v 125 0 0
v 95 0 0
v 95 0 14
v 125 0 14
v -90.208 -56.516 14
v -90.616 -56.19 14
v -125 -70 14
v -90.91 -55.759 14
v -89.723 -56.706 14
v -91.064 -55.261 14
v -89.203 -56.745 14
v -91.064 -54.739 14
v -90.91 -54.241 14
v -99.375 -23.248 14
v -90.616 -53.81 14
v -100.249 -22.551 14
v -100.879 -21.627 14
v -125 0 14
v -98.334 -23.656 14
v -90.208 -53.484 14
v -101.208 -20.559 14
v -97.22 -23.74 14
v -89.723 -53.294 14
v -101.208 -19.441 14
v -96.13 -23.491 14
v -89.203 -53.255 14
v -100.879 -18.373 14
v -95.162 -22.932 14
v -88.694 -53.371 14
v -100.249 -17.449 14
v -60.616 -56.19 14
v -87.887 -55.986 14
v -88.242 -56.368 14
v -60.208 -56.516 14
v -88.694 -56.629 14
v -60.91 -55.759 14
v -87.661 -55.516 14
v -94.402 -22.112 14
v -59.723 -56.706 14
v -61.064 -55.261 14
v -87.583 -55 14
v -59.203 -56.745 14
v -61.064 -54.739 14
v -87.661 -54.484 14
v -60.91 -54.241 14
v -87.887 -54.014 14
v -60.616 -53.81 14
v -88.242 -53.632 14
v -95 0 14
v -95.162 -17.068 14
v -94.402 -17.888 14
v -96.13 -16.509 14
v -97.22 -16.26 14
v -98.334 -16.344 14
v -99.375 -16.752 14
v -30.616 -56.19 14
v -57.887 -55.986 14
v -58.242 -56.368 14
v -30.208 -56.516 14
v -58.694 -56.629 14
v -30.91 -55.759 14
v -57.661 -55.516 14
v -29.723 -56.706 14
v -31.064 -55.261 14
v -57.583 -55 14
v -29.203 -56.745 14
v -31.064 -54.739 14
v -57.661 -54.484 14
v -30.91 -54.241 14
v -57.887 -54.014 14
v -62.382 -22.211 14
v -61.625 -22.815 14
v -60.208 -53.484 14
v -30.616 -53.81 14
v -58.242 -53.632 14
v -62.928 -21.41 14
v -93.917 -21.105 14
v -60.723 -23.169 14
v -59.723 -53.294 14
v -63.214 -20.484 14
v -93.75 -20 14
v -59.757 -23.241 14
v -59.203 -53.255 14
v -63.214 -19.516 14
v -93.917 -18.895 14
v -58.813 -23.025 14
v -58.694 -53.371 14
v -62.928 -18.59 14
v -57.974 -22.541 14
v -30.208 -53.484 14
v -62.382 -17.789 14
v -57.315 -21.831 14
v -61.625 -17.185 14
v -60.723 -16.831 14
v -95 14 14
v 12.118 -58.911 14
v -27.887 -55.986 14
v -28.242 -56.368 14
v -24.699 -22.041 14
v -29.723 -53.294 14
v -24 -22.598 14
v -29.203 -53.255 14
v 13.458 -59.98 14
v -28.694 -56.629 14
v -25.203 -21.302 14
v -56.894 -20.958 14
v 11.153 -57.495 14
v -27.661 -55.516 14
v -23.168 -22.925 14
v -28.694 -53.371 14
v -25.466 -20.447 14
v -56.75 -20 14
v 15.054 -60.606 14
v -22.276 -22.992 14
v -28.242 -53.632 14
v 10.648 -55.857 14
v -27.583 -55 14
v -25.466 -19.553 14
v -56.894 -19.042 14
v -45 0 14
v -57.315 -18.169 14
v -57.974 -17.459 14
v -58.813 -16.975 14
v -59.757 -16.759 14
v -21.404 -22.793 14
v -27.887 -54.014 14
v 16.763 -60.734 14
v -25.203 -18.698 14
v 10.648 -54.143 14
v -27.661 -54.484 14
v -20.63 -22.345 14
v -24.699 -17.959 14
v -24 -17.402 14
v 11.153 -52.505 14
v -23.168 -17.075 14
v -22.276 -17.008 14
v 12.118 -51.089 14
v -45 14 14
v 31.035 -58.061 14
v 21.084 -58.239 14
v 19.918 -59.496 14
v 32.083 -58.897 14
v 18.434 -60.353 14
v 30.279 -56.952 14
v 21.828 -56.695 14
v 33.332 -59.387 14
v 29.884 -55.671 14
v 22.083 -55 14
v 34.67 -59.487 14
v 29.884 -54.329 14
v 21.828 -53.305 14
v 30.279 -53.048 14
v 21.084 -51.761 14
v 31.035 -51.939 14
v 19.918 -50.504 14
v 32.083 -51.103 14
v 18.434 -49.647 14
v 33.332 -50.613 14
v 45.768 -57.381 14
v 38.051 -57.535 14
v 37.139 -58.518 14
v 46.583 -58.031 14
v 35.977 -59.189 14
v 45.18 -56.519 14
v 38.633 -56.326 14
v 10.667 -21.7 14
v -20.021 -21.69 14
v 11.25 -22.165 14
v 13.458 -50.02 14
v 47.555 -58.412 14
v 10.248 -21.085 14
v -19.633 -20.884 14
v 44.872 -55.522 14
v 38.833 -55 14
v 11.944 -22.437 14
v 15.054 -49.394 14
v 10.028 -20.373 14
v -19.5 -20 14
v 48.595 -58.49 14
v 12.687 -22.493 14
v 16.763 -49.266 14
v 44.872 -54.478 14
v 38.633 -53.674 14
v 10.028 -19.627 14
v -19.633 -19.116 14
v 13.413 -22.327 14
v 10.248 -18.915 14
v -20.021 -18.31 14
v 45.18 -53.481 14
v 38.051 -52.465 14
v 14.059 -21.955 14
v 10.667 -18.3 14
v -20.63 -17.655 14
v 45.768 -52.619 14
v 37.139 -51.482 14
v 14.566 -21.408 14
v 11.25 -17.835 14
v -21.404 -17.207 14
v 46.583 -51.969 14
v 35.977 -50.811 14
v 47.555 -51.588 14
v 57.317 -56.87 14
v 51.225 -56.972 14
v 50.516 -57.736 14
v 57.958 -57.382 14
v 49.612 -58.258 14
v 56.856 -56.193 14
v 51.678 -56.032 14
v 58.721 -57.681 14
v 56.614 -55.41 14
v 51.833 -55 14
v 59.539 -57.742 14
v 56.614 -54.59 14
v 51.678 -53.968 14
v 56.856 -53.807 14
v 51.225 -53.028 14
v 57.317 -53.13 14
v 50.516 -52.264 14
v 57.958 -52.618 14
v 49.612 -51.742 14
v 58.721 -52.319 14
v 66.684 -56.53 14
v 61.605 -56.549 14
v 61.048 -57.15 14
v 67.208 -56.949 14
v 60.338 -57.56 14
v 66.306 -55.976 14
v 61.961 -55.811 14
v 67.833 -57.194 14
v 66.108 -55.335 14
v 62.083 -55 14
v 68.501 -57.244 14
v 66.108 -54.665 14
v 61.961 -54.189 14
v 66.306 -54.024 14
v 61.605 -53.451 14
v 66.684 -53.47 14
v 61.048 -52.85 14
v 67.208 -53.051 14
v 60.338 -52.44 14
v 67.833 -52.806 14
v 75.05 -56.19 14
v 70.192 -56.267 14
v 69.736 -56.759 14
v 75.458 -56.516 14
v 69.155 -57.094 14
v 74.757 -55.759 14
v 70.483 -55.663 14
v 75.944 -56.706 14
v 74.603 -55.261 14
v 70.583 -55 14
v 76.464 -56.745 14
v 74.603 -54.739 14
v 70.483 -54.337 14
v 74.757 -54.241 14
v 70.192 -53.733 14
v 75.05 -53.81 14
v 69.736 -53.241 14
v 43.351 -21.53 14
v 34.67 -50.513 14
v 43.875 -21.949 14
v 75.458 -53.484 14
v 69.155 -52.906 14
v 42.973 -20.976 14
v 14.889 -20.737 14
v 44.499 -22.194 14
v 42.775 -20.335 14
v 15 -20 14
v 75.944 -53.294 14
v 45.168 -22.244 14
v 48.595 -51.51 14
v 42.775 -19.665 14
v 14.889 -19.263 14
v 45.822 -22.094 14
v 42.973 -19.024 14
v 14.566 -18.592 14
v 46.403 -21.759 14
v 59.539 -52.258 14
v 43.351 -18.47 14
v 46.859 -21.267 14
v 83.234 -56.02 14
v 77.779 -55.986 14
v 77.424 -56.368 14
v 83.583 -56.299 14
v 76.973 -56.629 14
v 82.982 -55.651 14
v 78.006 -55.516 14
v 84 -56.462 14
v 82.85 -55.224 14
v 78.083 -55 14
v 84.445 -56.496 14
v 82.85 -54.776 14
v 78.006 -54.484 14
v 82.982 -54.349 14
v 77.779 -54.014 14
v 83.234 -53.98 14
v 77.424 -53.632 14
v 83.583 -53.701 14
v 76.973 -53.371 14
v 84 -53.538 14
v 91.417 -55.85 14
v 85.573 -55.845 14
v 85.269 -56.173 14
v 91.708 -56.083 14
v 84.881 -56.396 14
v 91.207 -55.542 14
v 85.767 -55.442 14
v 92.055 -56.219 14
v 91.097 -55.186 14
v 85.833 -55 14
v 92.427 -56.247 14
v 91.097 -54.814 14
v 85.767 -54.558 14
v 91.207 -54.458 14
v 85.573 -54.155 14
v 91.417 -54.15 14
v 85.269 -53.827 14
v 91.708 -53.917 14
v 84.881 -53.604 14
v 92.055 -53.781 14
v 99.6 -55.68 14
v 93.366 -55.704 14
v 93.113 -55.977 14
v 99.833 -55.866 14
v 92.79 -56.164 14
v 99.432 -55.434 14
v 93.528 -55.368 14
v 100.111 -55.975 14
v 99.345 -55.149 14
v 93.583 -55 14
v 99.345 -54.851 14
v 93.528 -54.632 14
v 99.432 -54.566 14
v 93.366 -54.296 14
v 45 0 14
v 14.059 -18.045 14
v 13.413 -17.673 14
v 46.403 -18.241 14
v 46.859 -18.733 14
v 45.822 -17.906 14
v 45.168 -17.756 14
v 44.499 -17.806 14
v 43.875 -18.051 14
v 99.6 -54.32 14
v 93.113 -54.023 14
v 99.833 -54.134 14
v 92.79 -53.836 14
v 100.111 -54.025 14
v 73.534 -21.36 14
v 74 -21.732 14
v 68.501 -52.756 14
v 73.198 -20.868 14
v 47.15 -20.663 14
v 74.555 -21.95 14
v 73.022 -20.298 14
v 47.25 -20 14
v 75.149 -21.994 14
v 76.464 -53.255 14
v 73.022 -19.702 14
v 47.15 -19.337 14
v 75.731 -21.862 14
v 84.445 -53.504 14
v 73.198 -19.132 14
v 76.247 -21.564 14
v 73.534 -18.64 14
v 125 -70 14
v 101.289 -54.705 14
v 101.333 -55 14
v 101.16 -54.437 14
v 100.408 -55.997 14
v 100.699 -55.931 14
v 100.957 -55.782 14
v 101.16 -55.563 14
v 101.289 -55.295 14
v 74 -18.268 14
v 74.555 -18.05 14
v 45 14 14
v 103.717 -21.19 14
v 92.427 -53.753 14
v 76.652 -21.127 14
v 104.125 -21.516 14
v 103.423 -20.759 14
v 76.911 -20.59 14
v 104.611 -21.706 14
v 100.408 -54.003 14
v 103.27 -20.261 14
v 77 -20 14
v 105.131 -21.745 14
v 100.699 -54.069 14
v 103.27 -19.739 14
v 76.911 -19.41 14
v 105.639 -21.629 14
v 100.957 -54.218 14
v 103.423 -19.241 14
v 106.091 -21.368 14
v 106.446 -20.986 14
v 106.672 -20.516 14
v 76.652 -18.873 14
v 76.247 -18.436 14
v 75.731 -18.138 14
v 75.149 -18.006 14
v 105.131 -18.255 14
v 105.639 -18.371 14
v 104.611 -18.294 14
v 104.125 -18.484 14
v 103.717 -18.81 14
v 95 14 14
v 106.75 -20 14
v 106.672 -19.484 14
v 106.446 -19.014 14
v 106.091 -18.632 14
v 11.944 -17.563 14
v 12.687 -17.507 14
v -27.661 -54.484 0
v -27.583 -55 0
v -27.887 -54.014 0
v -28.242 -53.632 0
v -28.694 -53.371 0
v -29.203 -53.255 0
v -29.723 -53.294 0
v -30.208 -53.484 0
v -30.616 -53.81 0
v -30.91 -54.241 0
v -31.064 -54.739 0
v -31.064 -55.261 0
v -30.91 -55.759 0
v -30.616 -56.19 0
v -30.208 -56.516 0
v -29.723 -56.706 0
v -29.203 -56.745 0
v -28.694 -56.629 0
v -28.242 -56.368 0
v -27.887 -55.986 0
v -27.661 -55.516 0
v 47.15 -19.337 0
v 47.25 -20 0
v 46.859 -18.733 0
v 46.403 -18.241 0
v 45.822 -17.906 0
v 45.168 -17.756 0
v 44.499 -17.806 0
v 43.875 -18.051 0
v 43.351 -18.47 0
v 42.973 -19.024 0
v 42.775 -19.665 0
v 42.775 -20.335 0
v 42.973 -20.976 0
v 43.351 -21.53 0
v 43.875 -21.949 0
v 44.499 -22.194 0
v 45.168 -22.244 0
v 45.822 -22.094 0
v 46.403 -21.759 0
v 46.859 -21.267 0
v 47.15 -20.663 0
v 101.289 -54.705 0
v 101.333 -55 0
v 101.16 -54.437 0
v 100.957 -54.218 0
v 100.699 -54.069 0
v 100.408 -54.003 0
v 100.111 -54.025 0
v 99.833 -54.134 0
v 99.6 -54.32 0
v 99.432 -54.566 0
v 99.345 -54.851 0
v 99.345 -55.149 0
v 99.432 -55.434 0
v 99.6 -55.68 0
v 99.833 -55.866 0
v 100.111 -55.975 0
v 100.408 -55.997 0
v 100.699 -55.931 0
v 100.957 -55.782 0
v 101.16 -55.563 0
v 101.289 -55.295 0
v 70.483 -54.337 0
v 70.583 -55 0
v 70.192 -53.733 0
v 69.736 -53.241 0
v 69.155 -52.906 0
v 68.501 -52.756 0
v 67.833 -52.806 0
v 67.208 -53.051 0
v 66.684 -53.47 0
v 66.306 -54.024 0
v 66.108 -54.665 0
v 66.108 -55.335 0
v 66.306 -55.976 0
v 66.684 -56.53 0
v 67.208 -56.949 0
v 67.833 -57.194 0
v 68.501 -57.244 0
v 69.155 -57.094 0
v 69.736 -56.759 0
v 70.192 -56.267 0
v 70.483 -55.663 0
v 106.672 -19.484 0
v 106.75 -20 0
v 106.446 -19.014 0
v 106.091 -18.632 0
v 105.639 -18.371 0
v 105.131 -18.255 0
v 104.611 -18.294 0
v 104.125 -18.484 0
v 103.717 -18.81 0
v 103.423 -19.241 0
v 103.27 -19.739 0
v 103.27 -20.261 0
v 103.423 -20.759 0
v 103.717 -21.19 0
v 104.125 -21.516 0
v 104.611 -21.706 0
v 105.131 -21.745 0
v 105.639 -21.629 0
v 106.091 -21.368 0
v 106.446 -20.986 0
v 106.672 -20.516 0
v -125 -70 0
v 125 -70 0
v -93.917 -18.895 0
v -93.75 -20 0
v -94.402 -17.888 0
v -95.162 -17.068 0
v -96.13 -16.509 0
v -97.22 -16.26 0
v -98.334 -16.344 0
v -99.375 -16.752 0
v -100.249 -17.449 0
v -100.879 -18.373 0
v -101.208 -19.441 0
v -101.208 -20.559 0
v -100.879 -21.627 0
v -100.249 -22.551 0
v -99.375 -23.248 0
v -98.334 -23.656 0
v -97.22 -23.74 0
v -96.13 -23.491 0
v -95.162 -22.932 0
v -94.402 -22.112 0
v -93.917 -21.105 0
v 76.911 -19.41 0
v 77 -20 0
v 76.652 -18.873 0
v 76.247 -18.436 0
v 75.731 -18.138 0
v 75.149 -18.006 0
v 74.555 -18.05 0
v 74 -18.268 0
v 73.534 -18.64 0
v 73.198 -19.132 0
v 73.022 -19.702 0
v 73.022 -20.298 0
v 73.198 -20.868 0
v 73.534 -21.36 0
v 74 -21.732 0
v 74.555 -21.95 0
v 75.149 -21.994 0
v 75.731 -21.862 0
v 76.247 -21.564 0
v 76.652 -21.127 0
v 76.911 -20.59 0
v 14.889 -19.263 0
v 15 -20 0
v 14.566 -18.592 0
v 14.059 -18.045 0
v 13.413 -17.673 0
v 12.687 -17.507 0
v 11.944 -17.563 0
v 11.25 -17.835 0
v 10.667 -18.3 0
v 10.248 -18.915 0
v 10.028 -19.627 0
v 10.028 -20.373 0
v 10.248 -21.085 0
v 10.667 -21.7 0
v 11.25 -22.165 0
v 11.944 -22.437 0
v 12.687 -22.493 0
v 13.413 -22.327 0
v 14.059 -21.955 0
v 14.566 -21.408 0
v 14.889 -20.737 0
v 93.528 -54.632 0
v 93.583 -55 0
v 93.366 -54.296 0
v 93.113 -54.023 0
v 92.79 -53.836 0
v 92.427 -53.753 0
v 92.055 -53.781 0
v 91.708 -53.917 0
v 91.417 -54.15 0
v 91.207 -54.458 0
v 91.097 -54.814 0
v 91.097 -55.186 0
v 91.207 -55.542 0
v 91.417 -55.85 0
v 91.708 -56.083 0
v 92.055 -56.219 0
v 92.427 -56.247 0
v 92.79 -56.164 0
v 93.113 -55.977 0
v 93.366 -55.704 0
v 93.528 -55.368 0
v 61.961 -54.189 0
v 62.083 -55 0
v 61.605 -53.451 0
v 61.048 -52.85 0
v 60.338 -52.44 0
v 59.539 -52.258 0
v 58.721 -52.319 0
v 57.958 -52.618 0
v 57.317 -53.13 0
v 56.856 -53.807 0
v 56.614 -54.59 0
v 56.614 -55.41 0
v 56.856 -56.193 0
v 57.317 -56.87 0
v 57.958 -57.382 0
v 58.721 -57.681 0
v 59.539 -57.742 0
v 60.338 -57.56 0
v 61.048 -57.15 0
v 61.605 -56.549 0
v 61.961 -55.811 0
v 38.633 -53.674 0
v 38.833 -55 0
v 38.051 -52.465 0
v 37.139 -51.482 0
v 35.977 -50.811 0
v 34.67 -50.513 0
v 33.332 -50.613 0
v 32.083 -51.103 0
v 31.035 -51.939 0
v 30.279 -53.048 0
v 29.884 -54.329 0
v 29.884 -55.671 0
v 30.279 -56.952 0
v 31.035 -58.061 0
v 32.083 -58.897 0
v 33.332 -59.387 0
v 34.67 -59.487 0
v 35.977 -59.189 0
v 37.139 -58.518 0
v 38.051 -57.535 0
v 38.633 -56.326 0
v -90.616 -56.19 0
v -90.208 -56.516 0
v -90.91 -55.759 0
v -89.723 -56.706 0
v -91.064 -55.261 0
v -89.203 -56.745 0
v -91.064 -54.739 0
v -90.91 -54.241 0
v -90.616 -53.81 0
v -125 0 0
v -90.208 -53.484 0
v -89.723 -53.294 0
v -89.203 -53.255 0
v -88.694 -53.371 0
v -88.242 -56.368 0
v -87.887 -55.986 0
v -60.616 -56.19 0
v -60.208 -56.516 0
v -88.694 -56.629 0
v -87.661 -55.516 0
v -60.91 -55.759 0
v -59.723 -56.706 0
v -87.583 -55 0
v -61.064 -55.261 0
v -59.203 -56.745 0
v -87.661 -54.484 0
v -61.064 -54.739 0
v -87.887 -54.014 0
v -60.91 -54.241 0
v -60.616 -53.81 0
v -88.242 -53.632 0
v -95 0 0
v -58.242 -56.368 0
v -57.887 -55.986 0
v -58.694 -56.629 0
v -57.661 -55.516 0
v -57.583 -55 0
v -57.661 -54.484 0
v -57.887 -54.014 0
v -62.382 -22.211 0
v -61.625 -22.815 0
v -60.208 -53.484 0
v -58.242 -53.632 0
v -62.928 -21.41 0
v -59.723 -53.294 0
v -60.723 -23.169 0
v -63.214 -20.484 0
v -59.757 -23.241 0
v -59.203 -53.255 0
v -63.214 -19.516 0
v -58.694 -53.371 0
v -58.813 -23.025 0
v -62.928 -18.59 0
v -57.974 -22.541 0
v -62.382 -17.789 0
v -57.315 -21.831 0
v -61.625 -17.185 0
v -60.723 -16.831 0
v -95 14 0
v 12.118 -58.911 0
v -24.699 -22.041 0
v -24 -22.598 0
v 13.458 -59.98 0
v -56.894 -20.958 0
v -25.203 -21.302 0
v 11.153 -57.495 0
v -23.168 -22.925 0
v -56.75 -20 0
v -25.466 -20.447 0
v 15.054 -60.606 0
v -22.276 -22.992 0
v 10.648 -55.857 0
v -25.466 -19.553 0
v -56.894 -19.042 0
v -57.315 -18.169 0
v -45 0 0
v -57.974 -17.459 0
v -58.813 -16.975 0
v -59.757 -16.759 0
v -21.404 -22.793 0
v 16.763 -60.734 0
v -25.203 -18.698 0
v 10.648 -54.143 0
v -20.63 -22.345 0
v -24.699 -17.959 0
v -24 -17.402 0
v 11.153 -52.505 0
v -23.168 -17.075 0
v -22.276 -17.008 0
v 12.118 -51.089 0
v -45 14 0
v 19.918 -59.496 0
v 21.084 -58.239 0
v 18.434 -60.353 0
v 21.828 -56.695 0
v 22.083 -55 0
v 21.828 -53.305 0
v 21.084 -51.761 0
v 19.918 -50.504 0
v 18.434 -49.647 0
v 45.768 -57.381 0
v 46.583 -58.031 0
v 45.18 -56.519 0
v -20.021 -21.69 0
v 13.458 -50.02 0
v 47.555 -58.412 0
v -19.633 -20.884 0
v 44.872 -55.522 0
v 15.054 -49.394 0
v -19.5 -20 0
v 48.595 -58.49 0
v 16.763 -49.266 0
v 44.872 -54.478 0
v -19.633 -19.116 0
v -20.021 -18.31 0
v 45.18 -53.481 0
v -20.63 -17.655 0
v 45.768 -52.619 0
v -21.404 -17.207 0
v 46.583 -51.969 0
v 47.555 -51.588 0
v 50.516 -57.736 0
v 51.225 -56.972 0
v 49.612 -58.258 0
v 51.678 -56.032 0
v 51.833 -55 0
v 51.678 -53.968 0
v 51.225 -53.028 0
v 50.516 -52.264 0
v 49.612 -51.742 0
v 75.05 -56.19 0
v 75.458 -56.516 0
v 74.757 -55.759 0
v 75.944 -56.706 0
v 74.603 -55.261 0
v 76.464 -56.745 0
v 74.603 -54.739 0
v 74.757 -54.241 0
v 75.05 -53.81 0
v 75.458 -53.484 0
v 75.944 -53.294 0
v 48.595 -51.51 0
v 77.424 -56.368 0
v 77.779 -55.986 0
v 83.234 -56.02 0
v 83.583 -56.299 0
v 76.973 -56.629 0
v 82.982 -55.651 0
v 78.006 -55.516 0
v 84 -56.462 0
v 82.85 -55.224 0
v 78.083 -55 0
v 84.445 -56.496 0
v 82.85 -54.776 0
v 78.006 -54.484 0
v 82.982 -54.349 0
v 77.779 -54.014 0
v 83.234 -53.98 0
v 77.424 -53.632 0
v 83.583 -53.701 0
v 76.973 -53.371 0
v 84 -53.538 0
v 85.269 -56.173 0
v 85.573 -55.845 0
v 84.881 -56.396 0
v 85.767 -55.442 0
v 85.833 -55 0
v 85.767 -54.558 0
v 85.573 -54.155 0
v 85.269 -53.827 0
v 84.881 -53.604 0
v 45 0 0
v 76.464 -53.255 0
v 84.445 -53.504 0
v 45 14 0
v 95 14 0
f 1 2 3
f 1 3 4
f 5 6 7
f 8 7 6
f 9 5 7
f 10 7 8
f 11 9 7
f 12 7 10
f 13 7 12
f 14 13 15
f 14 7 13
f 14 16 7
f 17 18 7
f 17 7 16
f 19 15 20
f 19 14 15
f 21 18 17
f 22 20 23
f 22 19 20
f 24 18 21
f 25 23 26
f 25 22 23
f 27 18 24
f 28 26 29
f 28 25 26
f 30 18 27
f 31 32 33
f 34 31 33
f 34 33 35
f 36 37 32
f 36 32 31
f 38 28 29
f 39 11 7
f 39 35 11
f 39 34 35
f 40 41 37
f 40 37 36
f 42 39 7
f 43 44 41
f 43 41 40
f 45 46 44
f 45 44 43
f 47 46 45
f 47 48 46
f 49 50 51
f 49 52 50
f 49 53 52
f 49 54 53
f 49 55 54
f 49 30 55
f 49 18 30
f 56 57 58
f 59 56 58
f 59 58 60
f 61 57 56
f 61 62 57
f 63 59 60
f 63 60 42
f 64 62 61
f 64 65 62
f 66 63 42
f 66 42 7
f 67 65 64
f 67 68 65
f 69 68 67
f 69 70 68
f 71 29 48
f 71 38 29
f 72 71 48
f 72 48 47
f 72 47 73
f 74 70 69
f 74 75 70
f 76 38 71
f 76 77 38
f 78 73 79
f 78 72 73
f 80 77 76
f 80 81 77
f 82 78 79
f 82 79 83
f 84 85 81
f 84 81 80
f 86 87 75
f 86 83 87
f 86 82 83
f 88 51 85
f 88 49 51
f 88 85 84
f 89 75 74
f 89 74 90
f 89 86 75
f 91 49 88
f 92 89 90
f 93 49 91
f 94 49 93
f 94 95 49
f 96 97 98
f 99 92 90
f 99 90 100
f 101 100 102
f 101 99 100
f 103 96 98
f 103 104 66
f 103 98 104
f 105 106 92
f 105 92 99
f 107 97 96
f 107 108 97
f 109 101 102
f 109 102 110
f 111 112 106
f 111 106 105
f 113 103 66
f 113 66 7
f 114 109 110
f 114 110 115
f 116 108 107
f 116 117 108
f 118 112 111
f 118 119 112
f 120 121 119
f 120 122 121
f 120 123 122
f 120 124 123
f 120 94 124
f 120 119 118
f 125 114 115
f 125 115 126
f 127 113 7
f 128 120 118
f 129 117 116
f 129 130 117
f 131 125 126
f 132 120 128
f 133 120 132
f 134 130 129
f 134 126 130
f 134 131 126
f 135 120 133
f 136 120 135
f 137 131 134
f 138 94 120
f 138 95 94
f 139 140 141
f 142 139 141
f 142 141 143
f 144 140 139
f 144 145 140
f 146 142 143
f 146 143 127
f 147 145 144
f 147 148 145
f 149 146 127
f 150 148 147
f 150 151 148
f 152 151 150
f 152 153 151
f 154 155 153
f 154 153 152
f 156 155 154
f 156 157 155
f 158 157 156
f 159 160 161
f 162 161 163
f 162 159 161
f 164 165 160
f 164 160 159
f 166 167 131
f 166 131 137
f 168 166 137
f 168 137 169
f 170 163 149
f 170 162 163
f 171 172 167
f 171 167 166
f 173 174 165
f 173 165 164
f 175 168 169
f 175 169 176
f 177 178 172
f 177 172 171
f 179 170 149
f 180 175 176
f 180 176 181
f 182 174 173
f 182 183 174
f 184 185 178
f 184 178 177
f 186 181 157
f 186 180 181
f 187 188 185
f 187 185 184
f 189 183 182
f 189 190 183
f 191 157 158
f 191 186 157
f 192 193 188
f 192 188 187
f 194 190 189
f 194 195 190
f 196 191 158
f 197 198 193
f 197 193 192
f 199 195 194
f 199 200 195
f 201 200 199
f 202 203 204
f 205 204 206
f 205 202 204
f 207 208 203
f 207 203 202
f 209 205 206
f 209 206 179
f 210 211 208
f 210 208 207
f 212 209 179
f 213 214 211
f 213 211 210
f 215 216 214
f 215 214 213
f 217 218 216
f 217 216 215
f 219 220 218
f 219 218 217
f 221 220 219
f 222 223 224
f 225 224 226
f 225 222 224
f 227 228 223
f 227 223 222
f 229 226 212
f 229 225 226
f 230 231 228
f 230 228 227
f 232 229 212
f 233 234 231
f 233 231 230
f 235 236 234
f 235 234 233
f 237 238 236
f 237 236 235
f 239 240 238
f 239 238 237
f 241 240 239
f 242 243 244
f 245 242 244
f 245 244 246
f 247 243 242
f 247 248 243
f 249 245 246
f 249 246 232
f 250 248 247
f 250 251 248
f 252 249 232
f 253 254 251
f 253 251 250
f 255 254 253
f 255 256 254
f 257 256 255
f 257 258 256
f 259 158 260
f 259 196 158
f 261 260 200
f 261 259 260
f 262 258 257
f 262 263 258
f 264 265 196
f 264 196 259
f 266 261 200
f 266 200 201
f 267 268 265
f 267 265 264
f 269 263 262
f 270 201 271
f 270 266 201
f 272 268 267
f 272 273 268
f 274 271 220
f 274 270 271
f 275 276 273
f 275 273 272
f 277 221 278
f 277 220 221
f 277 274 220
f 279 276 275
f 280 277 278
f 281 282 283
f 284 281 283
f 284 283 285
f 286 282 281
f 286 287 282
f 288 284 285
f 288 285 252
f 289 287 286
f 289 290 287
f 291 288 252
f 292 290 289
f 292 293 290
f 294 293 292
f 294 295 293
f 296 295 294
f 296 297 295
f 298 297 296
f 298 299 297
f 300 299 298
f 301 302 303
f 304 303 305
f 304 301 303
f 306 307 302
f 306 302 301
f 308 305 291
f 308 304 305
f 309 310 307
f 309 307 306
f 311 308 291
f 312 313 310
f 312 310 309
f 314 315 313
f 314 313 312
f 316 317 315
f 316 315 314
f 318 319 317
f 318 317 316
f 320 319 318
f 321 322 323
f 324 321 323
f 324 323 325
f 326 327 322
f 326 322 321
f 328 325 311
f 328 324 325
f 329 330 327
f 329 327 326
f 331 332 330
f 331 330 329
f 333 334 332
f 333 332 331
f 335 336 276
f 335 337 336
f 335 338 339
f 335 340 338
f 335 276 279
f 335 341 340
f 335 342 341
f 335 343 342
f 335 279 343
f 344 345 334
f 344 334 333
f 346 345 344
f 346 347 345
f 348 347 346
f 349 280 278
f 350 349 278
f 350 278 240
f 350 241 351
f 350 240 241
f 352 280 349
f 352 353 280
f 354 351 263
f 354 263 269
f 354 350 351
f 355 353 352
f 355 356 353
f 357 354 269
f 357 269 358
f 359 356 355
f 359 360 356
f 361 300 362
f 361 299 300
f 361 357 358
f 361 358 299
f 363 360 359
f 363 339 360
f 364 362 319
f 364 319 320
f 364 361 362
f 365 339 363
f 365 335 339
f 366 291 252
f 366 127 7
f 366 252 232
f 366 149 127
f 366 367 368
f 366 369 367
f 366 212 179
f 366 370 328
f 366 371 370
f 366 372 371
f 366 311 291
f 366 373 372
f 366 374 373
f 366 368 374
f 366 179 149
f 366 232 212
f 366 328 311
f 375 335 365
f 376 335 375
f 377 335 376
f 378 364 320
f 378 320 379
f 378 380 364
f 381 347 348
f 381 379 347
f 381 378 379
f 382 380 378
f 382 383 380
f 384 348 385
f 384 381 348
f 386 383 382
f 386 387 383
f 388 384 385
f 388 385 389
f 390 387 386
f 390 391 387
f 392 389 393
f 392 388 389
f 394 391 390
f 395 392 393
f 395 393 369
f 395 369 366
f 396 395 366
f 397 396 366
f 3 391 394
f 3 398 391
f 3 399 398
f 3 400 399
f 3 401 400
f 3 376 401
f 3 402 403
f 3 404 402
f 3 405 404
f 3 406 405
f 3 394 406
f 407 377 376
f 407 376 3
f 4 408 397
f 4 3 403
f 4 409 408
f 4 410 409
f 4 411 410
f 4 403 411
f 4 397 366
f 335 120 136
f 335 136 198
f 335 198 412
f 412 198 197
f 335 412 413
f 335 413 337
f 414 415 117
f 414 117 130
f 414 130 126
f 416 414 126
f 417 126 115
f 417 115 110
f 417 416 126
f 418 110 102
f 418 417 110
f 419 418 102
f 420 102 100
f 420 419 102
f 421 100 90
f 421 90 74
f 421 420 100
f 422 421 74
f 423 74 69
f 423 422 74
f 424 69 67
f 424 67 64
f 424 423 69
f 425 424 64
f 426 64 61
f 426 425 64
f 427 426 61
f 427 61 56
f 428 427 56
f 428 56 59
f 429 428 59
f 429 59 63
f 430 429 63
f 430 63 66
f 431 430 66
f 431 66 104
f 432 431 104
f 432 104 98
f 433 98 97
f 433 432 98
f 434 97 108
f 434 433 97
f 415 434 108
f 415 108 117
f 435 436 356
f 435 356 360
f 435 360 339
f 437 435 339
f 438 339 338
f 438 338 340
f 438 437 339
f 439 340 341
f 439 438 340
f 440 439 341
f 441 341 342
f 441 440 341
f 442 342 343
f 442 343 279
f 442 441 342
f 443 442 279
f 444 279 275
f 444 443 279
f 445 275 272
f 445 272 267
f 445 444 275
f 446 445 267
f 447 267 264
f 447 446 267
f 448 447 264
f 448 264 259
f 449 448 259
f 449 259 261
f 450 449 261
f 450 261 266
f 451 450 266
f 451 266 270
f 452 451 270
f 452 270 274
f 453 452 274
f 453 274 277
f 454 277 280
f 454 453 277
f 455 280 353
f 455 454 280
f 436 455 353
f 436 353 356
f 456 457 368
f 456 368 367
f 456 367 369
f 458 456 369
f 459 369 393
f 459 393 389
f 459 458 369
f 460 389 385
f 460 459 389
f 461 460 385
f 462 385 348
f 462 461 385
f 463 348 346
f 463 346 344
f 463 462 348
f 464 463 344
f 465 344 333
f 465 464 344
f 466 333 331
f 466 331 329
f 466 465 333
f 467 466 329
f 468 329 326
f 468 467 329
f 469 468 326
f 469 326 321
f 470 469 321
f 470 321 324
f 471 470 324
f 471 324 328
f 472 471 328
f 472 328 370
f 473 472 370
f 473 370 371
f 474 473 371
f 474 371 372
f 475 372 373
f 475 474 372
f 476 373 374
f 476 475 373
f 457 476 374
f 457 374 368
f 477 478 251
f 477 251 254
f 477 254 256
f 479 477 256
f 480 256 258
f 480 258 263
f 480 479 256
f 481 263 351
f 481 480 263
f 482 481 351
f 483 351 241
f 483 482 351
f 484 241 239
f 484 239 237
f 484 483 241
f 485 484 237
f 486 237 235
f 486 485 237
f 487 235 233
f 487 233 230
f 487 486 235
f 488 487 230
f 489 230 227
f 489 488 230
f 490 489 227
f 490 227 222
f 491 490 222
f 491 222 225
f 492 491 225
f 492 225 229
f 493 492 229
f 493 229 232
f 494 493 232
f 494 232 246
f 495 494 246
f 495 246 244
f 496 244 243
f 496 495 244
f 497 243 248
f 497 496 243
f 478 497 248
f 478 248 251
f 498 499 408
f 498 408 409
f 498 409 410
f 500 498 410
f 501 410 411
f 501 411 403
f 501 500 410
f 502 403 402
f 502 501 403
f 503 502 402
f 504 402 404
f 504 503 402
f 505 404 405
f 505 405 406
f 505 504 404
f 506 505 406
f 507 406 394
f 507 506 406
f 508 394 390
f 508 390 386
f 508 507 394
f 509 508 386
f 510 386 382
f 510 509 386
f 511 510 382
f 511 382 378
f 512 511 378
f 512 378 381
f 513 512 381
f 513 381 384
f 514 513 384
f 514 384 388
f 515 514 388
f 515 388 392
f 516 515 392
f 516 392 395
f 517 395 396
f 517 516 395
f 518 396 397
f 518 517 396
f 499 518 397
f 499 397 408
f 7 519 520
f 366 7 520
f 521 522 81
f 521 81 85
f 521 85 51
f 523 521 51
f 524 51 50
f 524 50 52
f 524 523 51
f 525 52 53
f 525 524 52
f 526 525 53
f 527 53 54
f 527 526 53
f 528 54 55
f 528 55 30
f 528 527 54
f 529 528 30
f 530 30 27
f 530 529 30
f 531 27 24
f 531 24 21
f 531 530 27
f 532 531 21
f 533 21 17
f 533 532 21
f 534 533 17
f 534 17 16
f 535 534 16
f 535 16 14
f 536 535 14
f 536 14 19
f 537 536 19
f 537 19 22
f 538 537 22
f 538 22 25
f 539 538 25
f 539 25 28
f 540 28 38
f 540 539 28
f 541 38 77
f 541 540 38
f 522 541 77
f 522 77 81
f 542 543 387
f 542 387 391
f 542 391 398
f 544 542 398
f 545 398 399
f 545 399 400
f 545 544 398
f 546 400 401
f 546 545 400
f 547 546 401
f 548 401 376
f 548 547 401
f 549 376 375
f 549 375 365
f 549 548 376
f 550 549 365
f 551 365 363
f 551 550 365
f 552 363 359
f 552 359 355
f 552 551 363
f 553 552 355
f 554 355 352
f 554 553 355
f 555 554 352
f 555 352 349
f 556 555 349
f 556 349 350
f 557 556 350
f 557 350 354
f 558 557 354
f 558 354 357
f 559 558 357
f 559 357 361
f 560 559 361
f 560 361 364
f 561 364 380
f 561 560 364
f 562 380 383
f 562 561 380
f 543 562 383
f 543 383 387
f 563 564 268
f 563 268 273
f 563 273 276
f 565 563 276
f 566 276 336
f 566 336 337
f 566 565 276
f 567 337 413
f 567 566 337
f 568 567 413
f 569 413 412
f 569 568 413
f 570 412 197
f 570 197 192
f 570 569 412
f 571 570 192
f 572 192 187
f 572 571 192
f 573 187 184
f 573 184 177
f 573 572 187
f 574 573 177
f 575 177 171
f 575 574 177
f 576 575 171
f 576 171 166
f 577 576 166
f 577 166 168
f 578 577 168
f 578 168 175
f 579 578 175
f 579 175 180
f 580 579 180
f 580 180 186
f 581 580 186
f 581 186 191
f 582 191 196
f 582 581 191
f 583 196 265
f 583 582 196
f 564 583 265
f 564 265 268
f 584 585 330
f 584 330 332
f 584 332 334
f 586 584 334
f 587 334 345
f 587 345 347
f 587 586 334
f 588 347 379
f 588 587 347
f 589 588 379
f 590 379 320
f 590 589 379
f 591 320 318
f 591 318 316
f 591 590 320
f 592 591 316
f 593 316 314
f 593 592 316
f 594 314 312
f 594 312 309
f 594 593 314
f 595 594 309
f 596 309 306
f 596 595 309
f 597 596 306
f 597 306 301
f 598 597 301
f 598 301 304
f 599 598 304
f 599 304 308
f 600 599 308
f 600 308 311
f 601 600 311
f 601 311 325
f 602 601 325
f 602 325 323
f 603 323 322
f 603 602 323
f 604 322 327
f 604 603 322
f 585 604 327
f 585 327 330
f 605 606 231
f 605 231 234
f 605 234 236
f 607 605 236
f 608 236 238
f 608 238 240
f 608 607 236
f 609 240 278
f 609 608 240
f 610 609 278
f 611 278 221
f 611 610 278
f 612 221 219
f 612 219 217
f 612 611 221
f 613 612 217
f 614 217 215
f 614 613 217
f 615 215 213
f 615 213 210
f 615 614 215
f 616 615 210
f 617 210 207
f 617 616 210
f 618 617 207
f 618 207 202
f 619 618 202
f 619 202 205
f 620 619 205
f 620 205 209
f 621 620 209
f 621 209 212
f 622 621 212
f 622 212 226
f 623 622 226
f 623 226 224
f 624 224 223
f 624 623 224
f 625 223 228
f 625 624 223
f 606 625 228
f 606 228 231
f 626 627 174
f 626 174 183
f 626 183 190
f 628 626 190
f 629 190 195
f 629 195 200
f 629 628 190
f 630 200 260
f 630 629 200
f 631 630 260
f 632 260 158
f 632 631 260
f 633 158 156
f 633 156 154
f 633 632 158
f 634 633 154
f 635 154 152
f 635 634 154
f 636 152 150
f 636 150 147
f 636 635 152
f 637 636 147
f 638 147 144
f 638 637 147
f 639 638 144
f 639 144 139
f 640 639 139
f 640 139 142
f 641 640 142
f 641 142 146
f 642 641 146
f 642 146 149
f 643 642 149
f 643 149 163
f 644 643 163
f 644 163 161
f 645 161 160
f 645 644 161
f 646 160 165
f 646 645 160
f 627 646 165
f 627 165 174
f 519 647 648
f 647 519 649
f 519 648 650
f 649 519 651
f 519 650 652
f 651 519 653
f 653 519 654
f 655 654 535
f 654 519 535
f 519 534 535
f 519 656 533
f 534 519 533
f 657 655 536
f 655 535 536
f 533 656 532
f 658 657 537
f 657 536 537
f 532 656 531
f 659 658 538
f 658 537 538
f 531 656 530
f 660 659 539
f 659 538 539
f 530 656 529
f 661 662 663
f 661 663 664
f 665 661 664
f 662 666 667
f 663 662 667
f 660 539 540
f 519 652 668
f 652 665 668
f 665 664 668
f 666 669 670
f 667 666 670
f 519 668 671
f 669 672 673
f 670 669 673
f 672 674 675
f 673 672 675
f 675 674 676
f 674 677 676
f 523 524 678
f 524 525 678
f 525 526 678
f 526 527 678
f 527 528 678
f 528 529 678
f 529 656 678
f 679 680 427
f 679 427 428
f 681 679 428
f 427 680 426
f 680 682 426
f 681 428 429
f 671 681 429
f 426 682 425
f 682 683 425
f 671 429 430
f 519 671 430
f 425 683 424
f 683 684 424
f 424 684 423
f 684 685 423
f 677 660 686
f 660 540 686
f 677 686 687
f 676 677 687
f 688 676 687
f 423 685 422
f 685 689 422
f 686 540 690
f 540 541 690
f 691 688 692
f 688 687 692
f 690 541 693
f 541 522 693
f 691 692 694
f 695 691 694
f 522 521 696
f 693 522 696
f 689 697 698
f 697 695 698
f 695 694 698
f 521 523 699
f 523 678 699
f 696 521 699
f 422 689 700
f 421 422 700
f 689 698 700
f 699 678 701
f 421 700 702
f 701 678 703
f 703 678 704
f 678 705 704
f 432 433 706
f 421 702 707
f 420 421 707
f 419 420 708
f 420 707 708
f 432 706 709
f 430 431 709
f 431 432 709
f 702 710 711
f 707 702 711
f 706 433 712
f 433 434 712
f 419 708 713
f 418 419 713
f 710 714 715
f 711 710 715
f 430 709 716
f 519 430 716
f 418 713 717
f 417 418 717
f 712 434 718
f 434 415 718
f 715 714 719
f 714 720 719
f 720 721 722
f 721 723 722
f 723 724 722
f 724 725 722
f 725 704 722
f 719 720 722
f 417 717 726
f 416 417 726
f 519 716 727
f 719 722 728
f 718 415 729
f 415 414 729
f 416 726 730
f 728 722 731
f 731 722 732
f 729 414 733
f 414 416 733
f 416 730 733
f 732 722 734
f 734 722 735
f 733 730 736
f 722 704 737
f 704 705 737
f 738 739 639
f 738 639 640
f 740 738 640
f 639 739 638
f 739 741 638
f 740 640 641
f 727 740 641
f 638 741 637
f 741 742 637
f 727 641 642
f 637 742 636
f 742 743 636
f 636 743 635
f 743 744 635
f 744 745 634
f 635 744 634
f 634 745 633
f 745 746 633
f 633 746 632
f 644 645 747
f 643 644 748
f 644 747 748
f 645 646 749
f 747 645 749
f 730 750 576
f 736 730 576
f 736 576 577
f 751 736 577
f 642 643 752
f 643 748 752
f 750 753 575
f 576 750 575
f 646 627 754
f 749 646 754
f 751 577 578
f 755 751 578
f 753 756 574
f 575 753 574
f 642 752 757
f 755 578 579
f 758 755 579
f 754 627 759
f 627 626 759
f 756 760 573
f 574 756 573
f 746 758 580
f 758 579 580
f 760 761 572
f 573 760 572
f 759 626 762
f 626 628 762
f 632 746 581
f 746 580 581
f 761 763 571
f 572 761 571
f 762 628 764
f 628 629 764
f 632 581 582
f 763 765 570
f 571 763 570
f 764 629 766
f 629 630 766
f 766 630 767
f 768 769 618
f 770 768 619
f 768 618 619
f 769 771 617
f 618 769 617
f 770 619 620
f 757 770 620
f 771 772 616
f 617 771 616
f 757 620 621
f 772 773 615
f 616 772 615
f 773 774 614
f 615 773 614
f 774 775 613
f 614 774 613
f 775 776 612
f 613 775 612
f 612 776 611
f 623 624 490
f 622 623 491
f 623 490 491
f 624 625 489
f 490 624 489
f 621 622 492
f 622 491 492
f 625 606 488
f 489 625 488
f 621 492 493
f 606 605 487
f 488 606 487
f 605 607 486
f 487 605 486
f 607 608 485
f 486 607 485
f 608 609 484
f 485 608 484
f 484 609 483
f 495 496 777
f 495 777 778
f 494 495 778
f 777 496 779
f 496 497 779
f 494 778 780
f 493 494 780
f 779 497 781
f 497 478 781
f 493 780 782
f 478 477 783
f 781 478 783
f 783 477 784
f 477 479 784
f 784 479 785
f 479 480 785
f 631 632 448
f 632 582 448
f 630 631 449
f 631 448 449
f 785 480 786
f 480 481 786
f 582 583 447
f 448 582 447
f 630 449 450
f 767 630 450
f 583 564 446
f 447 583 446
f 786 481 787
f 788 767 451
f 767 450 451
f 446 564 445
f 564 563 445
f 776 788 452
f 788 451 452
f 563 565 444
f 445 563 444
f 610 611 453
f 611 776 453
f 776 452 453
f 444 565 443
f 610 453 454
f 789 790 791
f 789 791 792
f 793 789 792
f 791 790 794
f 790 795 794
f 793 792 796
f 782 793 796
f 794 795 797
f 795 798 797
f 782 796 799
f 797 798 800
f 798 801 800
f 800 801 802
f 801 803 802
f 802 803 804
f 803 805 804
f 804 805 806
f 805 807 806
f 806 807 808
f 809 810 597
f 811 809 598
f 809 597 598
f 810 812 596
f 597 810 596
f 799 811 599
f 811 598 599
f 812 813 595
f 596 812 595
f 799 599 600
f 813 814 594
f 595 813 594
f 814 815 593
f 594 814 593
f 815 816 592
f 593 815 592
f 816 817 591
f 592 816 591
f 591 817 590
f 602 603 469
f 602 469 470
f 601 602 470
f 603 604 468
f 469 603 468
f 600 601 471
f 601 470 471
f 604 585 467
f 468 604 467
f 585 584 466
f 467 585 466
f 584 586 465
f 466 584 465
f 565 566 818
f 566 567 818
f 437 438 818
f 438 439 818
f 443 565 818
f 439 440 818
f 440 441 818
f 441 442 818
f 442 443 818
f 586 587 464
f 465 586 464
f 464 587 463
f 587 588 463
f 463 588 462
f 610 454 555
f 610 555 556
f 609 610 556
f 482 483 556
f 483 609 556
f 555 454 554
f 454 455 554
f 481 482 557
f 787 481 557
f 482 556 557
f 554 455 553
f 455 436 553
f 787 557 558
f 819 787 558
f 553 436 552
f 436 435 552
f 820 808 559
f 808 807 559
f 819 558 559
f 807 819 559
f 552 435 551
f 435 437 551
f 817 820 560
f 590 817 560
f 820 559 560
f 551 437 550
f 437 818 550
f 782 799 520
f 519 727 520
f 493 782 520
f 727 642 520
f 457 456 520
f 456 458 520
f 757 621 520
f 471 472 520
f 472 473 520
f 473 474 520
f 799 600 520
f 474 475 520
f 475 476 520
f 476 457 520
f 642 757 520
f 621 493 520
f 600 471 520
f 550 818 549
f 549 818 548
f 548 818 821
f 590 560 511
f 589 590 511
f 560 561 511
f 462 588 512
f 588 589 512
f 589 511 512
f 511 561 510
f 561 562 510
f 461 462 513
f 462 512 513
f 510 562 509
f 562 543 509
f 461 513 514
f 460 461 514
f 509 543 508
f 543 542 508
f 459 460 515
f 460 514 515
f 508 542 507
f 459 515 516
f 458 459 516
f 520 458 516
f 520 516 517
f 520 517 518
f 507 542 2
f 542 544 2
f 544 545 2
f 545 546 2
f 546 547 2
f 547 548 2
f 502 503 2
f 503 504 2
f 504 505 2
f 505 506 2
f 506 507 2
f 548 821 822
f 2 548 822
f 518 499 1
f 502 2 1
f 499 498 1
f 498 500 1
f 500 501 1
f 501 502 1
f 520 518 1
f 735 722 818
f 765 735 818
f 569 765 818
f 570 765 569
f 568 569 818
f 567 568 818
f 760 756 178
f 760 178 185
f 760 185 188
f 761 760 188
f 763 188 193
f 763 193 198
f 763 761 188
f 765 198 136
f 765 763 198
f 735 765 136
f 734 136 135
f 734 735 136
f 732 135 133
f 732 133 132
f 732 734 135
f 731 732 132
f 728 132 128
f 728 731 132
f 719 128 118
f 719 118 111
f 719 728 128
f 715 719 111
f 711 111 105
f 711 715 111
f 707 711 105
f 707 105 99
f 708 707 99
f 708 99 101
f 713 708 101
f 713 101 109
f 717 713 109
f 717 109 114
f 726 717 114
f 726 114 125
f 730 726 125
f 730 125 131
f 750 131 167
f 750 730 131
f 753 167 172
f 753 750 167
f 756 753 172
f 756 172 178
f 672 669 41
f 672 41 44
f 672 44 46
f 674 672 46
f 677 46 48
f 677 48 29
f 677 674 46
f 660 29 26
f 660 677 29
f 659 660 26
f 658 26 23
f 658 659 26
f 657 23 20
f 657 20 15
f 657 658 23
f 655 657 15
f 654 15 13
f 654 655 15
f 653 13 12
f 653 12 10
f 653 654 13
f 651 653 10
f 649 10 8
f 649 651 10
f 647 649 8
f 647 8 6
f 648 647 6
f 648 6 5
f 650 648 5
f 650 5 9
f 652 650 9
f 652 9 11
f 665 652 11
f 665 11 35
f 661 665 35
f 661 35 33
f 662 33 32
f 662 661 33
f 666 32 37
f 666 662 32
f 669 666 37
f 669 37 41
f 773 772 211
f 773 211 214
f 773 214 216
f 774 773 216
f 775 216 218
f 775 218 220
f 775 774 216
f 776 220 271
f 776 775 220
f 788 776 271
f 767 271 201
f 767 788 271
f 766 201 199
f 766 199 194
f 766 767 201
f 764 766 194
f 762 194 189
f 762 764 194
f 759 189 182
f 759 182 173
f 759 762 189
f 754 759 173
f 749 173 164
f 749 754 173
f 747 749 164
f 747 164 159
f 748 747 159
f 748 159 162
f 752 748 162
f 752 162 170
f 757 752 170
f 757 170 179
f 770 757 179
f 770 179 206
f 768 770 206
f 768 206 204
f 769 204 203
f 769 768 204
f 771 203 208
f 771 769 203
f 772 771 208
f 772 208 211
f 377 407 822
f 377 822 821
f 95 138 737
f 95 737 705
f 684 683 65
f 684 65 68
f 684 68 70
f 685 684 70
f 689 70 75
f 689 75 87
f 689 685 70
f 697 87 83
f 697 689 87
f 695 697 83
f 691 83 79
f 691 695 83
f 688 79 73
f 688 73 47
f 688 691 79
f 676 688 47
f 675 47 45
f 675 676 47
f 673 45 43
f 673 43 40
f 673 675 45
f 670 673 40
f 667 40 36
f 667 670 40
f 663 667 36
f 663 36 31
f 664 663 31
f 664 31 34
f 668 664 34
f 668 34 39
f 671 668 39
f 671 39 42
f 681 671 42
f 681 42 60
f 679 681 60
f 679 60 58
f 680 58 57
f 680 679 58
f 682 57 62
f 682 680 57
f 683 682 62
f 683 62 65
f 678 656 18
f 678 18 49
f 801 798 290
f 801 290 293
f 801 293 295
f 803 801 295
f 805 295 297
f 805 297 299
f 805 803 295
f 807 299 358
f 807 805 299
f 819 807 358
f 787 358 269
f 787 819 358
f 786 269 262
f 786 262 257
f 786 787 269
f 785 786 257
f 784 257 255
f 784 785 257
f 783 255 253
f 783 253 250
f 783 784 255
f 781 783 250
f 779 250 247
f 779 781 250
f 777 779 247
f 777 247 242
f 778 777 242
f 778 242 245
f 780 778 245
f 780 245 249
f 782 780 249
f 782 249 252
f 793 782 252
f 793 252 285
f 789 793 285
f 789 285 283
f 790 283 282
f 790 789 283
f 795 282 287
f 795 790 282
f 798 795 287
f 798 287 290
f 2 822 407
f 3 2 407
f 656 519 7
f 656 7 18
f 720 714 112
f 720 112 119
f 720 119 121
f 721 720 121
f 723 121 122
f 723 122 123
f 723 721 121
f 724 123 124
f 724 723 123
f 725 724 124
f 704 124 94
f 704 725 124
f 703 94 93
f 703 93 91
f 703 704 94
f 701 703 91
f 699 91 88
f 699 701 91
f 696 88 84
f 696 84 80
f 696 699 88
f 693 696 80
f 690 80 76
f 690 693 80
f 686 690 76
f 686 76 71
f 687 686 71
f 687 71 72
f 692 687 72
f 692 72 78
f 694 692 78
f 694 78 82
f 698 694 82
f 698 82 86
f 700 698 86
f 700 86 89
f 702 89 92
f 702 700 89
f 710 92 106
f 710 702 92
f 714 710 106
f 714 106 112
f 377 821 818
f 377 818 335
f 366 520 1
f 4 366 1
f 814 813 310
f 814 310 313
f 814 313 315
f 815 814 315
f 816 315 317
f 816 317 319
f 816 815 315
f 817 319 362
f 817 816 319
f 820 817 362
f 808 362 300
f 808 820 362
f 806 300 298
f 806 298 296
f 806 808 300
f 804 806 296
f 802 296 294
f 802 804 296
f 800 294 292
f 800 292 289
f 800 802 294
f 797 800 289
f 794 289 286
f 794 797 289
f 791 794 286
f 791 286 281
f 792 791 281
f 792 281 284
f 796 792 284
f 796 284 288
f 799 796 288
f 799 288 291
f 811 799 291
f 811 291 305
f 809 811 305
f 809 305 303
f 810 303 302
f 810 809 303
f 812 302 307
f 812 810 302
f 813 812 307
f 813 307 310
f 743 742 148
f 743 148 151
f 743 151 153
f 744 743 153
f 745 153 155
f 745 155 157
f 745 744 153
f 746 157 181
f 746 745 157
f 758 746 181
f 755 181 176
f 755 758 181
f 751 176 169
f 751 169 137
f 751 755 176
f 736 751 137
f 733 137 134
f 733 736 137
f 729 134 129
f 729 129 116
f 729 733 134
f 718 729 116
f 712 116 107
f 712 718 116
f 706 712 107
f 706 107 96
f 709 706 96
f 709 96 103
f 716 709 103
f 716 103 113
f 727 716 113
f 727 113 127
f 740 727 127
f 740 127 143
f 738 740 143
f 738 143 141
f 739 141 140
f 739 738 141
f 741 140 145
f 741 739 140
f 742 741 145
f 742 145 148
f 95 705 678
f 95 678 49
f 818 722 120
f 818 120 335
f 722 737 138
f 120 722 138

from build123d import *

# Parameters (mm, degrees)
F0_W     = 250
F0_H     = 70
F0_R     = 1.75
F0_R_2   = 5.75
F0_R_3   = 4.5
F0_R_4   = 3.5
F0_R_5   = 2.75
F0_R_6   = 2.25
F0_R_7   = 1.5
F0_R_8   = 1.25
F0_R_9   = 1
F0_R_10  = 3.75
F0_R_11  = 3.25
F0_R_12  = 3
F0_R_13  = 2.5
F0_R_14  = 2
F1_DEPTH = 14
F2_W     = 50
F2_H     = 14
F3_DEPTH = 14


with BuildPart() as f1:
    # F0 (on Top) → F1 (new body)
    with BuildSketch(Plane.XY):
        with Locations((0, -35)):
            Rectangle(F0_W, F0_H)
        with Locations((-89.333333, -55)):
            Circle(F0_R, mode=Mode.SUBTRACT)
        with Locations((-59.333333, -55)):
            Circle(F0_R, mode=Mode.SUBTRACT)
        with Locations((-29.333333, -55)):
            Circle(F0_R, mode=Mode.SUBTRACT)
        with Locations((16.333333, -55)):
            Circle(F0_R_2, mode=Mode.SUBTRACT)
        with Locations((34.333333, -55)):
            Circle(F0_R_3, mode=Mode.SUBTRACT)
        with Locations((48.333333, -55)):
            Circle(F0_R_4, mode=Mode.SUBTRACT)
        with Locations((59.333333, -55)):
            Circle(F0_R_5, mode=Mode.SUBTRACT)
        with Locations((68.333333, -55)):
            Circle(F0_R_6, mode=Mode.SUBTRACT)
        with Locations((76.333333, -55)):
            Circle(F0_R, mode=Mode.SUBTRACT)
        with Locations((84.333333, -55)):
            Circle(F0_R_7, mode=Mode.SUBTRACT)
        with Locations((92.333333, -55)):
            Circle(F0_R_8, mode=Mode.SUBTRACT)
        with Locations((100.333333, -55)):
            Circle(F0_R_9, mode=Mode.SUBTRACT)
        with Locations((-97.5, -20)):
            Circle(F0_R_10, mode=Mode.SUBTRACT)
        with Locations((-60, -20)):
            Circle(F0_R_11, mode=Mode.SUBTRACT)
        with Locations((-22.5, -20)):
            Circle(F0_R_12, mode=Mode.SUBTRACT)
        with Locations((12.5, -20)):
            Circle(F0_R_13, mode=Mode.SUBTRACT)
        with Locations((45, -20)):
            Circle(F0_R_6, mode=Mode.SUBTRACT)
        with Locations((75, -20)):
            Circle(F0_R_14, mode=Mode.SUBTRACT)
        with Locations((105, -20)):
            Circle(F0_R, mode=Mode.SUBTRACT)
    extrude(amount=F1_DEPTH)

    # F2 (on face) → F3 (join)
    with BuildSketch(Plane(origin=(0, 0, 0), x_dir=(-1, 0, 0), z_dir=(0, 1, 0))):
        with Locations((70, 7)):
            Rectangle(F2_W, F2_H)
        with Locations((-70, 7)):
            Rectangle(F2_W, F2_H)
    extrude(amount=F3_DEPTH)


solid = f1.part
